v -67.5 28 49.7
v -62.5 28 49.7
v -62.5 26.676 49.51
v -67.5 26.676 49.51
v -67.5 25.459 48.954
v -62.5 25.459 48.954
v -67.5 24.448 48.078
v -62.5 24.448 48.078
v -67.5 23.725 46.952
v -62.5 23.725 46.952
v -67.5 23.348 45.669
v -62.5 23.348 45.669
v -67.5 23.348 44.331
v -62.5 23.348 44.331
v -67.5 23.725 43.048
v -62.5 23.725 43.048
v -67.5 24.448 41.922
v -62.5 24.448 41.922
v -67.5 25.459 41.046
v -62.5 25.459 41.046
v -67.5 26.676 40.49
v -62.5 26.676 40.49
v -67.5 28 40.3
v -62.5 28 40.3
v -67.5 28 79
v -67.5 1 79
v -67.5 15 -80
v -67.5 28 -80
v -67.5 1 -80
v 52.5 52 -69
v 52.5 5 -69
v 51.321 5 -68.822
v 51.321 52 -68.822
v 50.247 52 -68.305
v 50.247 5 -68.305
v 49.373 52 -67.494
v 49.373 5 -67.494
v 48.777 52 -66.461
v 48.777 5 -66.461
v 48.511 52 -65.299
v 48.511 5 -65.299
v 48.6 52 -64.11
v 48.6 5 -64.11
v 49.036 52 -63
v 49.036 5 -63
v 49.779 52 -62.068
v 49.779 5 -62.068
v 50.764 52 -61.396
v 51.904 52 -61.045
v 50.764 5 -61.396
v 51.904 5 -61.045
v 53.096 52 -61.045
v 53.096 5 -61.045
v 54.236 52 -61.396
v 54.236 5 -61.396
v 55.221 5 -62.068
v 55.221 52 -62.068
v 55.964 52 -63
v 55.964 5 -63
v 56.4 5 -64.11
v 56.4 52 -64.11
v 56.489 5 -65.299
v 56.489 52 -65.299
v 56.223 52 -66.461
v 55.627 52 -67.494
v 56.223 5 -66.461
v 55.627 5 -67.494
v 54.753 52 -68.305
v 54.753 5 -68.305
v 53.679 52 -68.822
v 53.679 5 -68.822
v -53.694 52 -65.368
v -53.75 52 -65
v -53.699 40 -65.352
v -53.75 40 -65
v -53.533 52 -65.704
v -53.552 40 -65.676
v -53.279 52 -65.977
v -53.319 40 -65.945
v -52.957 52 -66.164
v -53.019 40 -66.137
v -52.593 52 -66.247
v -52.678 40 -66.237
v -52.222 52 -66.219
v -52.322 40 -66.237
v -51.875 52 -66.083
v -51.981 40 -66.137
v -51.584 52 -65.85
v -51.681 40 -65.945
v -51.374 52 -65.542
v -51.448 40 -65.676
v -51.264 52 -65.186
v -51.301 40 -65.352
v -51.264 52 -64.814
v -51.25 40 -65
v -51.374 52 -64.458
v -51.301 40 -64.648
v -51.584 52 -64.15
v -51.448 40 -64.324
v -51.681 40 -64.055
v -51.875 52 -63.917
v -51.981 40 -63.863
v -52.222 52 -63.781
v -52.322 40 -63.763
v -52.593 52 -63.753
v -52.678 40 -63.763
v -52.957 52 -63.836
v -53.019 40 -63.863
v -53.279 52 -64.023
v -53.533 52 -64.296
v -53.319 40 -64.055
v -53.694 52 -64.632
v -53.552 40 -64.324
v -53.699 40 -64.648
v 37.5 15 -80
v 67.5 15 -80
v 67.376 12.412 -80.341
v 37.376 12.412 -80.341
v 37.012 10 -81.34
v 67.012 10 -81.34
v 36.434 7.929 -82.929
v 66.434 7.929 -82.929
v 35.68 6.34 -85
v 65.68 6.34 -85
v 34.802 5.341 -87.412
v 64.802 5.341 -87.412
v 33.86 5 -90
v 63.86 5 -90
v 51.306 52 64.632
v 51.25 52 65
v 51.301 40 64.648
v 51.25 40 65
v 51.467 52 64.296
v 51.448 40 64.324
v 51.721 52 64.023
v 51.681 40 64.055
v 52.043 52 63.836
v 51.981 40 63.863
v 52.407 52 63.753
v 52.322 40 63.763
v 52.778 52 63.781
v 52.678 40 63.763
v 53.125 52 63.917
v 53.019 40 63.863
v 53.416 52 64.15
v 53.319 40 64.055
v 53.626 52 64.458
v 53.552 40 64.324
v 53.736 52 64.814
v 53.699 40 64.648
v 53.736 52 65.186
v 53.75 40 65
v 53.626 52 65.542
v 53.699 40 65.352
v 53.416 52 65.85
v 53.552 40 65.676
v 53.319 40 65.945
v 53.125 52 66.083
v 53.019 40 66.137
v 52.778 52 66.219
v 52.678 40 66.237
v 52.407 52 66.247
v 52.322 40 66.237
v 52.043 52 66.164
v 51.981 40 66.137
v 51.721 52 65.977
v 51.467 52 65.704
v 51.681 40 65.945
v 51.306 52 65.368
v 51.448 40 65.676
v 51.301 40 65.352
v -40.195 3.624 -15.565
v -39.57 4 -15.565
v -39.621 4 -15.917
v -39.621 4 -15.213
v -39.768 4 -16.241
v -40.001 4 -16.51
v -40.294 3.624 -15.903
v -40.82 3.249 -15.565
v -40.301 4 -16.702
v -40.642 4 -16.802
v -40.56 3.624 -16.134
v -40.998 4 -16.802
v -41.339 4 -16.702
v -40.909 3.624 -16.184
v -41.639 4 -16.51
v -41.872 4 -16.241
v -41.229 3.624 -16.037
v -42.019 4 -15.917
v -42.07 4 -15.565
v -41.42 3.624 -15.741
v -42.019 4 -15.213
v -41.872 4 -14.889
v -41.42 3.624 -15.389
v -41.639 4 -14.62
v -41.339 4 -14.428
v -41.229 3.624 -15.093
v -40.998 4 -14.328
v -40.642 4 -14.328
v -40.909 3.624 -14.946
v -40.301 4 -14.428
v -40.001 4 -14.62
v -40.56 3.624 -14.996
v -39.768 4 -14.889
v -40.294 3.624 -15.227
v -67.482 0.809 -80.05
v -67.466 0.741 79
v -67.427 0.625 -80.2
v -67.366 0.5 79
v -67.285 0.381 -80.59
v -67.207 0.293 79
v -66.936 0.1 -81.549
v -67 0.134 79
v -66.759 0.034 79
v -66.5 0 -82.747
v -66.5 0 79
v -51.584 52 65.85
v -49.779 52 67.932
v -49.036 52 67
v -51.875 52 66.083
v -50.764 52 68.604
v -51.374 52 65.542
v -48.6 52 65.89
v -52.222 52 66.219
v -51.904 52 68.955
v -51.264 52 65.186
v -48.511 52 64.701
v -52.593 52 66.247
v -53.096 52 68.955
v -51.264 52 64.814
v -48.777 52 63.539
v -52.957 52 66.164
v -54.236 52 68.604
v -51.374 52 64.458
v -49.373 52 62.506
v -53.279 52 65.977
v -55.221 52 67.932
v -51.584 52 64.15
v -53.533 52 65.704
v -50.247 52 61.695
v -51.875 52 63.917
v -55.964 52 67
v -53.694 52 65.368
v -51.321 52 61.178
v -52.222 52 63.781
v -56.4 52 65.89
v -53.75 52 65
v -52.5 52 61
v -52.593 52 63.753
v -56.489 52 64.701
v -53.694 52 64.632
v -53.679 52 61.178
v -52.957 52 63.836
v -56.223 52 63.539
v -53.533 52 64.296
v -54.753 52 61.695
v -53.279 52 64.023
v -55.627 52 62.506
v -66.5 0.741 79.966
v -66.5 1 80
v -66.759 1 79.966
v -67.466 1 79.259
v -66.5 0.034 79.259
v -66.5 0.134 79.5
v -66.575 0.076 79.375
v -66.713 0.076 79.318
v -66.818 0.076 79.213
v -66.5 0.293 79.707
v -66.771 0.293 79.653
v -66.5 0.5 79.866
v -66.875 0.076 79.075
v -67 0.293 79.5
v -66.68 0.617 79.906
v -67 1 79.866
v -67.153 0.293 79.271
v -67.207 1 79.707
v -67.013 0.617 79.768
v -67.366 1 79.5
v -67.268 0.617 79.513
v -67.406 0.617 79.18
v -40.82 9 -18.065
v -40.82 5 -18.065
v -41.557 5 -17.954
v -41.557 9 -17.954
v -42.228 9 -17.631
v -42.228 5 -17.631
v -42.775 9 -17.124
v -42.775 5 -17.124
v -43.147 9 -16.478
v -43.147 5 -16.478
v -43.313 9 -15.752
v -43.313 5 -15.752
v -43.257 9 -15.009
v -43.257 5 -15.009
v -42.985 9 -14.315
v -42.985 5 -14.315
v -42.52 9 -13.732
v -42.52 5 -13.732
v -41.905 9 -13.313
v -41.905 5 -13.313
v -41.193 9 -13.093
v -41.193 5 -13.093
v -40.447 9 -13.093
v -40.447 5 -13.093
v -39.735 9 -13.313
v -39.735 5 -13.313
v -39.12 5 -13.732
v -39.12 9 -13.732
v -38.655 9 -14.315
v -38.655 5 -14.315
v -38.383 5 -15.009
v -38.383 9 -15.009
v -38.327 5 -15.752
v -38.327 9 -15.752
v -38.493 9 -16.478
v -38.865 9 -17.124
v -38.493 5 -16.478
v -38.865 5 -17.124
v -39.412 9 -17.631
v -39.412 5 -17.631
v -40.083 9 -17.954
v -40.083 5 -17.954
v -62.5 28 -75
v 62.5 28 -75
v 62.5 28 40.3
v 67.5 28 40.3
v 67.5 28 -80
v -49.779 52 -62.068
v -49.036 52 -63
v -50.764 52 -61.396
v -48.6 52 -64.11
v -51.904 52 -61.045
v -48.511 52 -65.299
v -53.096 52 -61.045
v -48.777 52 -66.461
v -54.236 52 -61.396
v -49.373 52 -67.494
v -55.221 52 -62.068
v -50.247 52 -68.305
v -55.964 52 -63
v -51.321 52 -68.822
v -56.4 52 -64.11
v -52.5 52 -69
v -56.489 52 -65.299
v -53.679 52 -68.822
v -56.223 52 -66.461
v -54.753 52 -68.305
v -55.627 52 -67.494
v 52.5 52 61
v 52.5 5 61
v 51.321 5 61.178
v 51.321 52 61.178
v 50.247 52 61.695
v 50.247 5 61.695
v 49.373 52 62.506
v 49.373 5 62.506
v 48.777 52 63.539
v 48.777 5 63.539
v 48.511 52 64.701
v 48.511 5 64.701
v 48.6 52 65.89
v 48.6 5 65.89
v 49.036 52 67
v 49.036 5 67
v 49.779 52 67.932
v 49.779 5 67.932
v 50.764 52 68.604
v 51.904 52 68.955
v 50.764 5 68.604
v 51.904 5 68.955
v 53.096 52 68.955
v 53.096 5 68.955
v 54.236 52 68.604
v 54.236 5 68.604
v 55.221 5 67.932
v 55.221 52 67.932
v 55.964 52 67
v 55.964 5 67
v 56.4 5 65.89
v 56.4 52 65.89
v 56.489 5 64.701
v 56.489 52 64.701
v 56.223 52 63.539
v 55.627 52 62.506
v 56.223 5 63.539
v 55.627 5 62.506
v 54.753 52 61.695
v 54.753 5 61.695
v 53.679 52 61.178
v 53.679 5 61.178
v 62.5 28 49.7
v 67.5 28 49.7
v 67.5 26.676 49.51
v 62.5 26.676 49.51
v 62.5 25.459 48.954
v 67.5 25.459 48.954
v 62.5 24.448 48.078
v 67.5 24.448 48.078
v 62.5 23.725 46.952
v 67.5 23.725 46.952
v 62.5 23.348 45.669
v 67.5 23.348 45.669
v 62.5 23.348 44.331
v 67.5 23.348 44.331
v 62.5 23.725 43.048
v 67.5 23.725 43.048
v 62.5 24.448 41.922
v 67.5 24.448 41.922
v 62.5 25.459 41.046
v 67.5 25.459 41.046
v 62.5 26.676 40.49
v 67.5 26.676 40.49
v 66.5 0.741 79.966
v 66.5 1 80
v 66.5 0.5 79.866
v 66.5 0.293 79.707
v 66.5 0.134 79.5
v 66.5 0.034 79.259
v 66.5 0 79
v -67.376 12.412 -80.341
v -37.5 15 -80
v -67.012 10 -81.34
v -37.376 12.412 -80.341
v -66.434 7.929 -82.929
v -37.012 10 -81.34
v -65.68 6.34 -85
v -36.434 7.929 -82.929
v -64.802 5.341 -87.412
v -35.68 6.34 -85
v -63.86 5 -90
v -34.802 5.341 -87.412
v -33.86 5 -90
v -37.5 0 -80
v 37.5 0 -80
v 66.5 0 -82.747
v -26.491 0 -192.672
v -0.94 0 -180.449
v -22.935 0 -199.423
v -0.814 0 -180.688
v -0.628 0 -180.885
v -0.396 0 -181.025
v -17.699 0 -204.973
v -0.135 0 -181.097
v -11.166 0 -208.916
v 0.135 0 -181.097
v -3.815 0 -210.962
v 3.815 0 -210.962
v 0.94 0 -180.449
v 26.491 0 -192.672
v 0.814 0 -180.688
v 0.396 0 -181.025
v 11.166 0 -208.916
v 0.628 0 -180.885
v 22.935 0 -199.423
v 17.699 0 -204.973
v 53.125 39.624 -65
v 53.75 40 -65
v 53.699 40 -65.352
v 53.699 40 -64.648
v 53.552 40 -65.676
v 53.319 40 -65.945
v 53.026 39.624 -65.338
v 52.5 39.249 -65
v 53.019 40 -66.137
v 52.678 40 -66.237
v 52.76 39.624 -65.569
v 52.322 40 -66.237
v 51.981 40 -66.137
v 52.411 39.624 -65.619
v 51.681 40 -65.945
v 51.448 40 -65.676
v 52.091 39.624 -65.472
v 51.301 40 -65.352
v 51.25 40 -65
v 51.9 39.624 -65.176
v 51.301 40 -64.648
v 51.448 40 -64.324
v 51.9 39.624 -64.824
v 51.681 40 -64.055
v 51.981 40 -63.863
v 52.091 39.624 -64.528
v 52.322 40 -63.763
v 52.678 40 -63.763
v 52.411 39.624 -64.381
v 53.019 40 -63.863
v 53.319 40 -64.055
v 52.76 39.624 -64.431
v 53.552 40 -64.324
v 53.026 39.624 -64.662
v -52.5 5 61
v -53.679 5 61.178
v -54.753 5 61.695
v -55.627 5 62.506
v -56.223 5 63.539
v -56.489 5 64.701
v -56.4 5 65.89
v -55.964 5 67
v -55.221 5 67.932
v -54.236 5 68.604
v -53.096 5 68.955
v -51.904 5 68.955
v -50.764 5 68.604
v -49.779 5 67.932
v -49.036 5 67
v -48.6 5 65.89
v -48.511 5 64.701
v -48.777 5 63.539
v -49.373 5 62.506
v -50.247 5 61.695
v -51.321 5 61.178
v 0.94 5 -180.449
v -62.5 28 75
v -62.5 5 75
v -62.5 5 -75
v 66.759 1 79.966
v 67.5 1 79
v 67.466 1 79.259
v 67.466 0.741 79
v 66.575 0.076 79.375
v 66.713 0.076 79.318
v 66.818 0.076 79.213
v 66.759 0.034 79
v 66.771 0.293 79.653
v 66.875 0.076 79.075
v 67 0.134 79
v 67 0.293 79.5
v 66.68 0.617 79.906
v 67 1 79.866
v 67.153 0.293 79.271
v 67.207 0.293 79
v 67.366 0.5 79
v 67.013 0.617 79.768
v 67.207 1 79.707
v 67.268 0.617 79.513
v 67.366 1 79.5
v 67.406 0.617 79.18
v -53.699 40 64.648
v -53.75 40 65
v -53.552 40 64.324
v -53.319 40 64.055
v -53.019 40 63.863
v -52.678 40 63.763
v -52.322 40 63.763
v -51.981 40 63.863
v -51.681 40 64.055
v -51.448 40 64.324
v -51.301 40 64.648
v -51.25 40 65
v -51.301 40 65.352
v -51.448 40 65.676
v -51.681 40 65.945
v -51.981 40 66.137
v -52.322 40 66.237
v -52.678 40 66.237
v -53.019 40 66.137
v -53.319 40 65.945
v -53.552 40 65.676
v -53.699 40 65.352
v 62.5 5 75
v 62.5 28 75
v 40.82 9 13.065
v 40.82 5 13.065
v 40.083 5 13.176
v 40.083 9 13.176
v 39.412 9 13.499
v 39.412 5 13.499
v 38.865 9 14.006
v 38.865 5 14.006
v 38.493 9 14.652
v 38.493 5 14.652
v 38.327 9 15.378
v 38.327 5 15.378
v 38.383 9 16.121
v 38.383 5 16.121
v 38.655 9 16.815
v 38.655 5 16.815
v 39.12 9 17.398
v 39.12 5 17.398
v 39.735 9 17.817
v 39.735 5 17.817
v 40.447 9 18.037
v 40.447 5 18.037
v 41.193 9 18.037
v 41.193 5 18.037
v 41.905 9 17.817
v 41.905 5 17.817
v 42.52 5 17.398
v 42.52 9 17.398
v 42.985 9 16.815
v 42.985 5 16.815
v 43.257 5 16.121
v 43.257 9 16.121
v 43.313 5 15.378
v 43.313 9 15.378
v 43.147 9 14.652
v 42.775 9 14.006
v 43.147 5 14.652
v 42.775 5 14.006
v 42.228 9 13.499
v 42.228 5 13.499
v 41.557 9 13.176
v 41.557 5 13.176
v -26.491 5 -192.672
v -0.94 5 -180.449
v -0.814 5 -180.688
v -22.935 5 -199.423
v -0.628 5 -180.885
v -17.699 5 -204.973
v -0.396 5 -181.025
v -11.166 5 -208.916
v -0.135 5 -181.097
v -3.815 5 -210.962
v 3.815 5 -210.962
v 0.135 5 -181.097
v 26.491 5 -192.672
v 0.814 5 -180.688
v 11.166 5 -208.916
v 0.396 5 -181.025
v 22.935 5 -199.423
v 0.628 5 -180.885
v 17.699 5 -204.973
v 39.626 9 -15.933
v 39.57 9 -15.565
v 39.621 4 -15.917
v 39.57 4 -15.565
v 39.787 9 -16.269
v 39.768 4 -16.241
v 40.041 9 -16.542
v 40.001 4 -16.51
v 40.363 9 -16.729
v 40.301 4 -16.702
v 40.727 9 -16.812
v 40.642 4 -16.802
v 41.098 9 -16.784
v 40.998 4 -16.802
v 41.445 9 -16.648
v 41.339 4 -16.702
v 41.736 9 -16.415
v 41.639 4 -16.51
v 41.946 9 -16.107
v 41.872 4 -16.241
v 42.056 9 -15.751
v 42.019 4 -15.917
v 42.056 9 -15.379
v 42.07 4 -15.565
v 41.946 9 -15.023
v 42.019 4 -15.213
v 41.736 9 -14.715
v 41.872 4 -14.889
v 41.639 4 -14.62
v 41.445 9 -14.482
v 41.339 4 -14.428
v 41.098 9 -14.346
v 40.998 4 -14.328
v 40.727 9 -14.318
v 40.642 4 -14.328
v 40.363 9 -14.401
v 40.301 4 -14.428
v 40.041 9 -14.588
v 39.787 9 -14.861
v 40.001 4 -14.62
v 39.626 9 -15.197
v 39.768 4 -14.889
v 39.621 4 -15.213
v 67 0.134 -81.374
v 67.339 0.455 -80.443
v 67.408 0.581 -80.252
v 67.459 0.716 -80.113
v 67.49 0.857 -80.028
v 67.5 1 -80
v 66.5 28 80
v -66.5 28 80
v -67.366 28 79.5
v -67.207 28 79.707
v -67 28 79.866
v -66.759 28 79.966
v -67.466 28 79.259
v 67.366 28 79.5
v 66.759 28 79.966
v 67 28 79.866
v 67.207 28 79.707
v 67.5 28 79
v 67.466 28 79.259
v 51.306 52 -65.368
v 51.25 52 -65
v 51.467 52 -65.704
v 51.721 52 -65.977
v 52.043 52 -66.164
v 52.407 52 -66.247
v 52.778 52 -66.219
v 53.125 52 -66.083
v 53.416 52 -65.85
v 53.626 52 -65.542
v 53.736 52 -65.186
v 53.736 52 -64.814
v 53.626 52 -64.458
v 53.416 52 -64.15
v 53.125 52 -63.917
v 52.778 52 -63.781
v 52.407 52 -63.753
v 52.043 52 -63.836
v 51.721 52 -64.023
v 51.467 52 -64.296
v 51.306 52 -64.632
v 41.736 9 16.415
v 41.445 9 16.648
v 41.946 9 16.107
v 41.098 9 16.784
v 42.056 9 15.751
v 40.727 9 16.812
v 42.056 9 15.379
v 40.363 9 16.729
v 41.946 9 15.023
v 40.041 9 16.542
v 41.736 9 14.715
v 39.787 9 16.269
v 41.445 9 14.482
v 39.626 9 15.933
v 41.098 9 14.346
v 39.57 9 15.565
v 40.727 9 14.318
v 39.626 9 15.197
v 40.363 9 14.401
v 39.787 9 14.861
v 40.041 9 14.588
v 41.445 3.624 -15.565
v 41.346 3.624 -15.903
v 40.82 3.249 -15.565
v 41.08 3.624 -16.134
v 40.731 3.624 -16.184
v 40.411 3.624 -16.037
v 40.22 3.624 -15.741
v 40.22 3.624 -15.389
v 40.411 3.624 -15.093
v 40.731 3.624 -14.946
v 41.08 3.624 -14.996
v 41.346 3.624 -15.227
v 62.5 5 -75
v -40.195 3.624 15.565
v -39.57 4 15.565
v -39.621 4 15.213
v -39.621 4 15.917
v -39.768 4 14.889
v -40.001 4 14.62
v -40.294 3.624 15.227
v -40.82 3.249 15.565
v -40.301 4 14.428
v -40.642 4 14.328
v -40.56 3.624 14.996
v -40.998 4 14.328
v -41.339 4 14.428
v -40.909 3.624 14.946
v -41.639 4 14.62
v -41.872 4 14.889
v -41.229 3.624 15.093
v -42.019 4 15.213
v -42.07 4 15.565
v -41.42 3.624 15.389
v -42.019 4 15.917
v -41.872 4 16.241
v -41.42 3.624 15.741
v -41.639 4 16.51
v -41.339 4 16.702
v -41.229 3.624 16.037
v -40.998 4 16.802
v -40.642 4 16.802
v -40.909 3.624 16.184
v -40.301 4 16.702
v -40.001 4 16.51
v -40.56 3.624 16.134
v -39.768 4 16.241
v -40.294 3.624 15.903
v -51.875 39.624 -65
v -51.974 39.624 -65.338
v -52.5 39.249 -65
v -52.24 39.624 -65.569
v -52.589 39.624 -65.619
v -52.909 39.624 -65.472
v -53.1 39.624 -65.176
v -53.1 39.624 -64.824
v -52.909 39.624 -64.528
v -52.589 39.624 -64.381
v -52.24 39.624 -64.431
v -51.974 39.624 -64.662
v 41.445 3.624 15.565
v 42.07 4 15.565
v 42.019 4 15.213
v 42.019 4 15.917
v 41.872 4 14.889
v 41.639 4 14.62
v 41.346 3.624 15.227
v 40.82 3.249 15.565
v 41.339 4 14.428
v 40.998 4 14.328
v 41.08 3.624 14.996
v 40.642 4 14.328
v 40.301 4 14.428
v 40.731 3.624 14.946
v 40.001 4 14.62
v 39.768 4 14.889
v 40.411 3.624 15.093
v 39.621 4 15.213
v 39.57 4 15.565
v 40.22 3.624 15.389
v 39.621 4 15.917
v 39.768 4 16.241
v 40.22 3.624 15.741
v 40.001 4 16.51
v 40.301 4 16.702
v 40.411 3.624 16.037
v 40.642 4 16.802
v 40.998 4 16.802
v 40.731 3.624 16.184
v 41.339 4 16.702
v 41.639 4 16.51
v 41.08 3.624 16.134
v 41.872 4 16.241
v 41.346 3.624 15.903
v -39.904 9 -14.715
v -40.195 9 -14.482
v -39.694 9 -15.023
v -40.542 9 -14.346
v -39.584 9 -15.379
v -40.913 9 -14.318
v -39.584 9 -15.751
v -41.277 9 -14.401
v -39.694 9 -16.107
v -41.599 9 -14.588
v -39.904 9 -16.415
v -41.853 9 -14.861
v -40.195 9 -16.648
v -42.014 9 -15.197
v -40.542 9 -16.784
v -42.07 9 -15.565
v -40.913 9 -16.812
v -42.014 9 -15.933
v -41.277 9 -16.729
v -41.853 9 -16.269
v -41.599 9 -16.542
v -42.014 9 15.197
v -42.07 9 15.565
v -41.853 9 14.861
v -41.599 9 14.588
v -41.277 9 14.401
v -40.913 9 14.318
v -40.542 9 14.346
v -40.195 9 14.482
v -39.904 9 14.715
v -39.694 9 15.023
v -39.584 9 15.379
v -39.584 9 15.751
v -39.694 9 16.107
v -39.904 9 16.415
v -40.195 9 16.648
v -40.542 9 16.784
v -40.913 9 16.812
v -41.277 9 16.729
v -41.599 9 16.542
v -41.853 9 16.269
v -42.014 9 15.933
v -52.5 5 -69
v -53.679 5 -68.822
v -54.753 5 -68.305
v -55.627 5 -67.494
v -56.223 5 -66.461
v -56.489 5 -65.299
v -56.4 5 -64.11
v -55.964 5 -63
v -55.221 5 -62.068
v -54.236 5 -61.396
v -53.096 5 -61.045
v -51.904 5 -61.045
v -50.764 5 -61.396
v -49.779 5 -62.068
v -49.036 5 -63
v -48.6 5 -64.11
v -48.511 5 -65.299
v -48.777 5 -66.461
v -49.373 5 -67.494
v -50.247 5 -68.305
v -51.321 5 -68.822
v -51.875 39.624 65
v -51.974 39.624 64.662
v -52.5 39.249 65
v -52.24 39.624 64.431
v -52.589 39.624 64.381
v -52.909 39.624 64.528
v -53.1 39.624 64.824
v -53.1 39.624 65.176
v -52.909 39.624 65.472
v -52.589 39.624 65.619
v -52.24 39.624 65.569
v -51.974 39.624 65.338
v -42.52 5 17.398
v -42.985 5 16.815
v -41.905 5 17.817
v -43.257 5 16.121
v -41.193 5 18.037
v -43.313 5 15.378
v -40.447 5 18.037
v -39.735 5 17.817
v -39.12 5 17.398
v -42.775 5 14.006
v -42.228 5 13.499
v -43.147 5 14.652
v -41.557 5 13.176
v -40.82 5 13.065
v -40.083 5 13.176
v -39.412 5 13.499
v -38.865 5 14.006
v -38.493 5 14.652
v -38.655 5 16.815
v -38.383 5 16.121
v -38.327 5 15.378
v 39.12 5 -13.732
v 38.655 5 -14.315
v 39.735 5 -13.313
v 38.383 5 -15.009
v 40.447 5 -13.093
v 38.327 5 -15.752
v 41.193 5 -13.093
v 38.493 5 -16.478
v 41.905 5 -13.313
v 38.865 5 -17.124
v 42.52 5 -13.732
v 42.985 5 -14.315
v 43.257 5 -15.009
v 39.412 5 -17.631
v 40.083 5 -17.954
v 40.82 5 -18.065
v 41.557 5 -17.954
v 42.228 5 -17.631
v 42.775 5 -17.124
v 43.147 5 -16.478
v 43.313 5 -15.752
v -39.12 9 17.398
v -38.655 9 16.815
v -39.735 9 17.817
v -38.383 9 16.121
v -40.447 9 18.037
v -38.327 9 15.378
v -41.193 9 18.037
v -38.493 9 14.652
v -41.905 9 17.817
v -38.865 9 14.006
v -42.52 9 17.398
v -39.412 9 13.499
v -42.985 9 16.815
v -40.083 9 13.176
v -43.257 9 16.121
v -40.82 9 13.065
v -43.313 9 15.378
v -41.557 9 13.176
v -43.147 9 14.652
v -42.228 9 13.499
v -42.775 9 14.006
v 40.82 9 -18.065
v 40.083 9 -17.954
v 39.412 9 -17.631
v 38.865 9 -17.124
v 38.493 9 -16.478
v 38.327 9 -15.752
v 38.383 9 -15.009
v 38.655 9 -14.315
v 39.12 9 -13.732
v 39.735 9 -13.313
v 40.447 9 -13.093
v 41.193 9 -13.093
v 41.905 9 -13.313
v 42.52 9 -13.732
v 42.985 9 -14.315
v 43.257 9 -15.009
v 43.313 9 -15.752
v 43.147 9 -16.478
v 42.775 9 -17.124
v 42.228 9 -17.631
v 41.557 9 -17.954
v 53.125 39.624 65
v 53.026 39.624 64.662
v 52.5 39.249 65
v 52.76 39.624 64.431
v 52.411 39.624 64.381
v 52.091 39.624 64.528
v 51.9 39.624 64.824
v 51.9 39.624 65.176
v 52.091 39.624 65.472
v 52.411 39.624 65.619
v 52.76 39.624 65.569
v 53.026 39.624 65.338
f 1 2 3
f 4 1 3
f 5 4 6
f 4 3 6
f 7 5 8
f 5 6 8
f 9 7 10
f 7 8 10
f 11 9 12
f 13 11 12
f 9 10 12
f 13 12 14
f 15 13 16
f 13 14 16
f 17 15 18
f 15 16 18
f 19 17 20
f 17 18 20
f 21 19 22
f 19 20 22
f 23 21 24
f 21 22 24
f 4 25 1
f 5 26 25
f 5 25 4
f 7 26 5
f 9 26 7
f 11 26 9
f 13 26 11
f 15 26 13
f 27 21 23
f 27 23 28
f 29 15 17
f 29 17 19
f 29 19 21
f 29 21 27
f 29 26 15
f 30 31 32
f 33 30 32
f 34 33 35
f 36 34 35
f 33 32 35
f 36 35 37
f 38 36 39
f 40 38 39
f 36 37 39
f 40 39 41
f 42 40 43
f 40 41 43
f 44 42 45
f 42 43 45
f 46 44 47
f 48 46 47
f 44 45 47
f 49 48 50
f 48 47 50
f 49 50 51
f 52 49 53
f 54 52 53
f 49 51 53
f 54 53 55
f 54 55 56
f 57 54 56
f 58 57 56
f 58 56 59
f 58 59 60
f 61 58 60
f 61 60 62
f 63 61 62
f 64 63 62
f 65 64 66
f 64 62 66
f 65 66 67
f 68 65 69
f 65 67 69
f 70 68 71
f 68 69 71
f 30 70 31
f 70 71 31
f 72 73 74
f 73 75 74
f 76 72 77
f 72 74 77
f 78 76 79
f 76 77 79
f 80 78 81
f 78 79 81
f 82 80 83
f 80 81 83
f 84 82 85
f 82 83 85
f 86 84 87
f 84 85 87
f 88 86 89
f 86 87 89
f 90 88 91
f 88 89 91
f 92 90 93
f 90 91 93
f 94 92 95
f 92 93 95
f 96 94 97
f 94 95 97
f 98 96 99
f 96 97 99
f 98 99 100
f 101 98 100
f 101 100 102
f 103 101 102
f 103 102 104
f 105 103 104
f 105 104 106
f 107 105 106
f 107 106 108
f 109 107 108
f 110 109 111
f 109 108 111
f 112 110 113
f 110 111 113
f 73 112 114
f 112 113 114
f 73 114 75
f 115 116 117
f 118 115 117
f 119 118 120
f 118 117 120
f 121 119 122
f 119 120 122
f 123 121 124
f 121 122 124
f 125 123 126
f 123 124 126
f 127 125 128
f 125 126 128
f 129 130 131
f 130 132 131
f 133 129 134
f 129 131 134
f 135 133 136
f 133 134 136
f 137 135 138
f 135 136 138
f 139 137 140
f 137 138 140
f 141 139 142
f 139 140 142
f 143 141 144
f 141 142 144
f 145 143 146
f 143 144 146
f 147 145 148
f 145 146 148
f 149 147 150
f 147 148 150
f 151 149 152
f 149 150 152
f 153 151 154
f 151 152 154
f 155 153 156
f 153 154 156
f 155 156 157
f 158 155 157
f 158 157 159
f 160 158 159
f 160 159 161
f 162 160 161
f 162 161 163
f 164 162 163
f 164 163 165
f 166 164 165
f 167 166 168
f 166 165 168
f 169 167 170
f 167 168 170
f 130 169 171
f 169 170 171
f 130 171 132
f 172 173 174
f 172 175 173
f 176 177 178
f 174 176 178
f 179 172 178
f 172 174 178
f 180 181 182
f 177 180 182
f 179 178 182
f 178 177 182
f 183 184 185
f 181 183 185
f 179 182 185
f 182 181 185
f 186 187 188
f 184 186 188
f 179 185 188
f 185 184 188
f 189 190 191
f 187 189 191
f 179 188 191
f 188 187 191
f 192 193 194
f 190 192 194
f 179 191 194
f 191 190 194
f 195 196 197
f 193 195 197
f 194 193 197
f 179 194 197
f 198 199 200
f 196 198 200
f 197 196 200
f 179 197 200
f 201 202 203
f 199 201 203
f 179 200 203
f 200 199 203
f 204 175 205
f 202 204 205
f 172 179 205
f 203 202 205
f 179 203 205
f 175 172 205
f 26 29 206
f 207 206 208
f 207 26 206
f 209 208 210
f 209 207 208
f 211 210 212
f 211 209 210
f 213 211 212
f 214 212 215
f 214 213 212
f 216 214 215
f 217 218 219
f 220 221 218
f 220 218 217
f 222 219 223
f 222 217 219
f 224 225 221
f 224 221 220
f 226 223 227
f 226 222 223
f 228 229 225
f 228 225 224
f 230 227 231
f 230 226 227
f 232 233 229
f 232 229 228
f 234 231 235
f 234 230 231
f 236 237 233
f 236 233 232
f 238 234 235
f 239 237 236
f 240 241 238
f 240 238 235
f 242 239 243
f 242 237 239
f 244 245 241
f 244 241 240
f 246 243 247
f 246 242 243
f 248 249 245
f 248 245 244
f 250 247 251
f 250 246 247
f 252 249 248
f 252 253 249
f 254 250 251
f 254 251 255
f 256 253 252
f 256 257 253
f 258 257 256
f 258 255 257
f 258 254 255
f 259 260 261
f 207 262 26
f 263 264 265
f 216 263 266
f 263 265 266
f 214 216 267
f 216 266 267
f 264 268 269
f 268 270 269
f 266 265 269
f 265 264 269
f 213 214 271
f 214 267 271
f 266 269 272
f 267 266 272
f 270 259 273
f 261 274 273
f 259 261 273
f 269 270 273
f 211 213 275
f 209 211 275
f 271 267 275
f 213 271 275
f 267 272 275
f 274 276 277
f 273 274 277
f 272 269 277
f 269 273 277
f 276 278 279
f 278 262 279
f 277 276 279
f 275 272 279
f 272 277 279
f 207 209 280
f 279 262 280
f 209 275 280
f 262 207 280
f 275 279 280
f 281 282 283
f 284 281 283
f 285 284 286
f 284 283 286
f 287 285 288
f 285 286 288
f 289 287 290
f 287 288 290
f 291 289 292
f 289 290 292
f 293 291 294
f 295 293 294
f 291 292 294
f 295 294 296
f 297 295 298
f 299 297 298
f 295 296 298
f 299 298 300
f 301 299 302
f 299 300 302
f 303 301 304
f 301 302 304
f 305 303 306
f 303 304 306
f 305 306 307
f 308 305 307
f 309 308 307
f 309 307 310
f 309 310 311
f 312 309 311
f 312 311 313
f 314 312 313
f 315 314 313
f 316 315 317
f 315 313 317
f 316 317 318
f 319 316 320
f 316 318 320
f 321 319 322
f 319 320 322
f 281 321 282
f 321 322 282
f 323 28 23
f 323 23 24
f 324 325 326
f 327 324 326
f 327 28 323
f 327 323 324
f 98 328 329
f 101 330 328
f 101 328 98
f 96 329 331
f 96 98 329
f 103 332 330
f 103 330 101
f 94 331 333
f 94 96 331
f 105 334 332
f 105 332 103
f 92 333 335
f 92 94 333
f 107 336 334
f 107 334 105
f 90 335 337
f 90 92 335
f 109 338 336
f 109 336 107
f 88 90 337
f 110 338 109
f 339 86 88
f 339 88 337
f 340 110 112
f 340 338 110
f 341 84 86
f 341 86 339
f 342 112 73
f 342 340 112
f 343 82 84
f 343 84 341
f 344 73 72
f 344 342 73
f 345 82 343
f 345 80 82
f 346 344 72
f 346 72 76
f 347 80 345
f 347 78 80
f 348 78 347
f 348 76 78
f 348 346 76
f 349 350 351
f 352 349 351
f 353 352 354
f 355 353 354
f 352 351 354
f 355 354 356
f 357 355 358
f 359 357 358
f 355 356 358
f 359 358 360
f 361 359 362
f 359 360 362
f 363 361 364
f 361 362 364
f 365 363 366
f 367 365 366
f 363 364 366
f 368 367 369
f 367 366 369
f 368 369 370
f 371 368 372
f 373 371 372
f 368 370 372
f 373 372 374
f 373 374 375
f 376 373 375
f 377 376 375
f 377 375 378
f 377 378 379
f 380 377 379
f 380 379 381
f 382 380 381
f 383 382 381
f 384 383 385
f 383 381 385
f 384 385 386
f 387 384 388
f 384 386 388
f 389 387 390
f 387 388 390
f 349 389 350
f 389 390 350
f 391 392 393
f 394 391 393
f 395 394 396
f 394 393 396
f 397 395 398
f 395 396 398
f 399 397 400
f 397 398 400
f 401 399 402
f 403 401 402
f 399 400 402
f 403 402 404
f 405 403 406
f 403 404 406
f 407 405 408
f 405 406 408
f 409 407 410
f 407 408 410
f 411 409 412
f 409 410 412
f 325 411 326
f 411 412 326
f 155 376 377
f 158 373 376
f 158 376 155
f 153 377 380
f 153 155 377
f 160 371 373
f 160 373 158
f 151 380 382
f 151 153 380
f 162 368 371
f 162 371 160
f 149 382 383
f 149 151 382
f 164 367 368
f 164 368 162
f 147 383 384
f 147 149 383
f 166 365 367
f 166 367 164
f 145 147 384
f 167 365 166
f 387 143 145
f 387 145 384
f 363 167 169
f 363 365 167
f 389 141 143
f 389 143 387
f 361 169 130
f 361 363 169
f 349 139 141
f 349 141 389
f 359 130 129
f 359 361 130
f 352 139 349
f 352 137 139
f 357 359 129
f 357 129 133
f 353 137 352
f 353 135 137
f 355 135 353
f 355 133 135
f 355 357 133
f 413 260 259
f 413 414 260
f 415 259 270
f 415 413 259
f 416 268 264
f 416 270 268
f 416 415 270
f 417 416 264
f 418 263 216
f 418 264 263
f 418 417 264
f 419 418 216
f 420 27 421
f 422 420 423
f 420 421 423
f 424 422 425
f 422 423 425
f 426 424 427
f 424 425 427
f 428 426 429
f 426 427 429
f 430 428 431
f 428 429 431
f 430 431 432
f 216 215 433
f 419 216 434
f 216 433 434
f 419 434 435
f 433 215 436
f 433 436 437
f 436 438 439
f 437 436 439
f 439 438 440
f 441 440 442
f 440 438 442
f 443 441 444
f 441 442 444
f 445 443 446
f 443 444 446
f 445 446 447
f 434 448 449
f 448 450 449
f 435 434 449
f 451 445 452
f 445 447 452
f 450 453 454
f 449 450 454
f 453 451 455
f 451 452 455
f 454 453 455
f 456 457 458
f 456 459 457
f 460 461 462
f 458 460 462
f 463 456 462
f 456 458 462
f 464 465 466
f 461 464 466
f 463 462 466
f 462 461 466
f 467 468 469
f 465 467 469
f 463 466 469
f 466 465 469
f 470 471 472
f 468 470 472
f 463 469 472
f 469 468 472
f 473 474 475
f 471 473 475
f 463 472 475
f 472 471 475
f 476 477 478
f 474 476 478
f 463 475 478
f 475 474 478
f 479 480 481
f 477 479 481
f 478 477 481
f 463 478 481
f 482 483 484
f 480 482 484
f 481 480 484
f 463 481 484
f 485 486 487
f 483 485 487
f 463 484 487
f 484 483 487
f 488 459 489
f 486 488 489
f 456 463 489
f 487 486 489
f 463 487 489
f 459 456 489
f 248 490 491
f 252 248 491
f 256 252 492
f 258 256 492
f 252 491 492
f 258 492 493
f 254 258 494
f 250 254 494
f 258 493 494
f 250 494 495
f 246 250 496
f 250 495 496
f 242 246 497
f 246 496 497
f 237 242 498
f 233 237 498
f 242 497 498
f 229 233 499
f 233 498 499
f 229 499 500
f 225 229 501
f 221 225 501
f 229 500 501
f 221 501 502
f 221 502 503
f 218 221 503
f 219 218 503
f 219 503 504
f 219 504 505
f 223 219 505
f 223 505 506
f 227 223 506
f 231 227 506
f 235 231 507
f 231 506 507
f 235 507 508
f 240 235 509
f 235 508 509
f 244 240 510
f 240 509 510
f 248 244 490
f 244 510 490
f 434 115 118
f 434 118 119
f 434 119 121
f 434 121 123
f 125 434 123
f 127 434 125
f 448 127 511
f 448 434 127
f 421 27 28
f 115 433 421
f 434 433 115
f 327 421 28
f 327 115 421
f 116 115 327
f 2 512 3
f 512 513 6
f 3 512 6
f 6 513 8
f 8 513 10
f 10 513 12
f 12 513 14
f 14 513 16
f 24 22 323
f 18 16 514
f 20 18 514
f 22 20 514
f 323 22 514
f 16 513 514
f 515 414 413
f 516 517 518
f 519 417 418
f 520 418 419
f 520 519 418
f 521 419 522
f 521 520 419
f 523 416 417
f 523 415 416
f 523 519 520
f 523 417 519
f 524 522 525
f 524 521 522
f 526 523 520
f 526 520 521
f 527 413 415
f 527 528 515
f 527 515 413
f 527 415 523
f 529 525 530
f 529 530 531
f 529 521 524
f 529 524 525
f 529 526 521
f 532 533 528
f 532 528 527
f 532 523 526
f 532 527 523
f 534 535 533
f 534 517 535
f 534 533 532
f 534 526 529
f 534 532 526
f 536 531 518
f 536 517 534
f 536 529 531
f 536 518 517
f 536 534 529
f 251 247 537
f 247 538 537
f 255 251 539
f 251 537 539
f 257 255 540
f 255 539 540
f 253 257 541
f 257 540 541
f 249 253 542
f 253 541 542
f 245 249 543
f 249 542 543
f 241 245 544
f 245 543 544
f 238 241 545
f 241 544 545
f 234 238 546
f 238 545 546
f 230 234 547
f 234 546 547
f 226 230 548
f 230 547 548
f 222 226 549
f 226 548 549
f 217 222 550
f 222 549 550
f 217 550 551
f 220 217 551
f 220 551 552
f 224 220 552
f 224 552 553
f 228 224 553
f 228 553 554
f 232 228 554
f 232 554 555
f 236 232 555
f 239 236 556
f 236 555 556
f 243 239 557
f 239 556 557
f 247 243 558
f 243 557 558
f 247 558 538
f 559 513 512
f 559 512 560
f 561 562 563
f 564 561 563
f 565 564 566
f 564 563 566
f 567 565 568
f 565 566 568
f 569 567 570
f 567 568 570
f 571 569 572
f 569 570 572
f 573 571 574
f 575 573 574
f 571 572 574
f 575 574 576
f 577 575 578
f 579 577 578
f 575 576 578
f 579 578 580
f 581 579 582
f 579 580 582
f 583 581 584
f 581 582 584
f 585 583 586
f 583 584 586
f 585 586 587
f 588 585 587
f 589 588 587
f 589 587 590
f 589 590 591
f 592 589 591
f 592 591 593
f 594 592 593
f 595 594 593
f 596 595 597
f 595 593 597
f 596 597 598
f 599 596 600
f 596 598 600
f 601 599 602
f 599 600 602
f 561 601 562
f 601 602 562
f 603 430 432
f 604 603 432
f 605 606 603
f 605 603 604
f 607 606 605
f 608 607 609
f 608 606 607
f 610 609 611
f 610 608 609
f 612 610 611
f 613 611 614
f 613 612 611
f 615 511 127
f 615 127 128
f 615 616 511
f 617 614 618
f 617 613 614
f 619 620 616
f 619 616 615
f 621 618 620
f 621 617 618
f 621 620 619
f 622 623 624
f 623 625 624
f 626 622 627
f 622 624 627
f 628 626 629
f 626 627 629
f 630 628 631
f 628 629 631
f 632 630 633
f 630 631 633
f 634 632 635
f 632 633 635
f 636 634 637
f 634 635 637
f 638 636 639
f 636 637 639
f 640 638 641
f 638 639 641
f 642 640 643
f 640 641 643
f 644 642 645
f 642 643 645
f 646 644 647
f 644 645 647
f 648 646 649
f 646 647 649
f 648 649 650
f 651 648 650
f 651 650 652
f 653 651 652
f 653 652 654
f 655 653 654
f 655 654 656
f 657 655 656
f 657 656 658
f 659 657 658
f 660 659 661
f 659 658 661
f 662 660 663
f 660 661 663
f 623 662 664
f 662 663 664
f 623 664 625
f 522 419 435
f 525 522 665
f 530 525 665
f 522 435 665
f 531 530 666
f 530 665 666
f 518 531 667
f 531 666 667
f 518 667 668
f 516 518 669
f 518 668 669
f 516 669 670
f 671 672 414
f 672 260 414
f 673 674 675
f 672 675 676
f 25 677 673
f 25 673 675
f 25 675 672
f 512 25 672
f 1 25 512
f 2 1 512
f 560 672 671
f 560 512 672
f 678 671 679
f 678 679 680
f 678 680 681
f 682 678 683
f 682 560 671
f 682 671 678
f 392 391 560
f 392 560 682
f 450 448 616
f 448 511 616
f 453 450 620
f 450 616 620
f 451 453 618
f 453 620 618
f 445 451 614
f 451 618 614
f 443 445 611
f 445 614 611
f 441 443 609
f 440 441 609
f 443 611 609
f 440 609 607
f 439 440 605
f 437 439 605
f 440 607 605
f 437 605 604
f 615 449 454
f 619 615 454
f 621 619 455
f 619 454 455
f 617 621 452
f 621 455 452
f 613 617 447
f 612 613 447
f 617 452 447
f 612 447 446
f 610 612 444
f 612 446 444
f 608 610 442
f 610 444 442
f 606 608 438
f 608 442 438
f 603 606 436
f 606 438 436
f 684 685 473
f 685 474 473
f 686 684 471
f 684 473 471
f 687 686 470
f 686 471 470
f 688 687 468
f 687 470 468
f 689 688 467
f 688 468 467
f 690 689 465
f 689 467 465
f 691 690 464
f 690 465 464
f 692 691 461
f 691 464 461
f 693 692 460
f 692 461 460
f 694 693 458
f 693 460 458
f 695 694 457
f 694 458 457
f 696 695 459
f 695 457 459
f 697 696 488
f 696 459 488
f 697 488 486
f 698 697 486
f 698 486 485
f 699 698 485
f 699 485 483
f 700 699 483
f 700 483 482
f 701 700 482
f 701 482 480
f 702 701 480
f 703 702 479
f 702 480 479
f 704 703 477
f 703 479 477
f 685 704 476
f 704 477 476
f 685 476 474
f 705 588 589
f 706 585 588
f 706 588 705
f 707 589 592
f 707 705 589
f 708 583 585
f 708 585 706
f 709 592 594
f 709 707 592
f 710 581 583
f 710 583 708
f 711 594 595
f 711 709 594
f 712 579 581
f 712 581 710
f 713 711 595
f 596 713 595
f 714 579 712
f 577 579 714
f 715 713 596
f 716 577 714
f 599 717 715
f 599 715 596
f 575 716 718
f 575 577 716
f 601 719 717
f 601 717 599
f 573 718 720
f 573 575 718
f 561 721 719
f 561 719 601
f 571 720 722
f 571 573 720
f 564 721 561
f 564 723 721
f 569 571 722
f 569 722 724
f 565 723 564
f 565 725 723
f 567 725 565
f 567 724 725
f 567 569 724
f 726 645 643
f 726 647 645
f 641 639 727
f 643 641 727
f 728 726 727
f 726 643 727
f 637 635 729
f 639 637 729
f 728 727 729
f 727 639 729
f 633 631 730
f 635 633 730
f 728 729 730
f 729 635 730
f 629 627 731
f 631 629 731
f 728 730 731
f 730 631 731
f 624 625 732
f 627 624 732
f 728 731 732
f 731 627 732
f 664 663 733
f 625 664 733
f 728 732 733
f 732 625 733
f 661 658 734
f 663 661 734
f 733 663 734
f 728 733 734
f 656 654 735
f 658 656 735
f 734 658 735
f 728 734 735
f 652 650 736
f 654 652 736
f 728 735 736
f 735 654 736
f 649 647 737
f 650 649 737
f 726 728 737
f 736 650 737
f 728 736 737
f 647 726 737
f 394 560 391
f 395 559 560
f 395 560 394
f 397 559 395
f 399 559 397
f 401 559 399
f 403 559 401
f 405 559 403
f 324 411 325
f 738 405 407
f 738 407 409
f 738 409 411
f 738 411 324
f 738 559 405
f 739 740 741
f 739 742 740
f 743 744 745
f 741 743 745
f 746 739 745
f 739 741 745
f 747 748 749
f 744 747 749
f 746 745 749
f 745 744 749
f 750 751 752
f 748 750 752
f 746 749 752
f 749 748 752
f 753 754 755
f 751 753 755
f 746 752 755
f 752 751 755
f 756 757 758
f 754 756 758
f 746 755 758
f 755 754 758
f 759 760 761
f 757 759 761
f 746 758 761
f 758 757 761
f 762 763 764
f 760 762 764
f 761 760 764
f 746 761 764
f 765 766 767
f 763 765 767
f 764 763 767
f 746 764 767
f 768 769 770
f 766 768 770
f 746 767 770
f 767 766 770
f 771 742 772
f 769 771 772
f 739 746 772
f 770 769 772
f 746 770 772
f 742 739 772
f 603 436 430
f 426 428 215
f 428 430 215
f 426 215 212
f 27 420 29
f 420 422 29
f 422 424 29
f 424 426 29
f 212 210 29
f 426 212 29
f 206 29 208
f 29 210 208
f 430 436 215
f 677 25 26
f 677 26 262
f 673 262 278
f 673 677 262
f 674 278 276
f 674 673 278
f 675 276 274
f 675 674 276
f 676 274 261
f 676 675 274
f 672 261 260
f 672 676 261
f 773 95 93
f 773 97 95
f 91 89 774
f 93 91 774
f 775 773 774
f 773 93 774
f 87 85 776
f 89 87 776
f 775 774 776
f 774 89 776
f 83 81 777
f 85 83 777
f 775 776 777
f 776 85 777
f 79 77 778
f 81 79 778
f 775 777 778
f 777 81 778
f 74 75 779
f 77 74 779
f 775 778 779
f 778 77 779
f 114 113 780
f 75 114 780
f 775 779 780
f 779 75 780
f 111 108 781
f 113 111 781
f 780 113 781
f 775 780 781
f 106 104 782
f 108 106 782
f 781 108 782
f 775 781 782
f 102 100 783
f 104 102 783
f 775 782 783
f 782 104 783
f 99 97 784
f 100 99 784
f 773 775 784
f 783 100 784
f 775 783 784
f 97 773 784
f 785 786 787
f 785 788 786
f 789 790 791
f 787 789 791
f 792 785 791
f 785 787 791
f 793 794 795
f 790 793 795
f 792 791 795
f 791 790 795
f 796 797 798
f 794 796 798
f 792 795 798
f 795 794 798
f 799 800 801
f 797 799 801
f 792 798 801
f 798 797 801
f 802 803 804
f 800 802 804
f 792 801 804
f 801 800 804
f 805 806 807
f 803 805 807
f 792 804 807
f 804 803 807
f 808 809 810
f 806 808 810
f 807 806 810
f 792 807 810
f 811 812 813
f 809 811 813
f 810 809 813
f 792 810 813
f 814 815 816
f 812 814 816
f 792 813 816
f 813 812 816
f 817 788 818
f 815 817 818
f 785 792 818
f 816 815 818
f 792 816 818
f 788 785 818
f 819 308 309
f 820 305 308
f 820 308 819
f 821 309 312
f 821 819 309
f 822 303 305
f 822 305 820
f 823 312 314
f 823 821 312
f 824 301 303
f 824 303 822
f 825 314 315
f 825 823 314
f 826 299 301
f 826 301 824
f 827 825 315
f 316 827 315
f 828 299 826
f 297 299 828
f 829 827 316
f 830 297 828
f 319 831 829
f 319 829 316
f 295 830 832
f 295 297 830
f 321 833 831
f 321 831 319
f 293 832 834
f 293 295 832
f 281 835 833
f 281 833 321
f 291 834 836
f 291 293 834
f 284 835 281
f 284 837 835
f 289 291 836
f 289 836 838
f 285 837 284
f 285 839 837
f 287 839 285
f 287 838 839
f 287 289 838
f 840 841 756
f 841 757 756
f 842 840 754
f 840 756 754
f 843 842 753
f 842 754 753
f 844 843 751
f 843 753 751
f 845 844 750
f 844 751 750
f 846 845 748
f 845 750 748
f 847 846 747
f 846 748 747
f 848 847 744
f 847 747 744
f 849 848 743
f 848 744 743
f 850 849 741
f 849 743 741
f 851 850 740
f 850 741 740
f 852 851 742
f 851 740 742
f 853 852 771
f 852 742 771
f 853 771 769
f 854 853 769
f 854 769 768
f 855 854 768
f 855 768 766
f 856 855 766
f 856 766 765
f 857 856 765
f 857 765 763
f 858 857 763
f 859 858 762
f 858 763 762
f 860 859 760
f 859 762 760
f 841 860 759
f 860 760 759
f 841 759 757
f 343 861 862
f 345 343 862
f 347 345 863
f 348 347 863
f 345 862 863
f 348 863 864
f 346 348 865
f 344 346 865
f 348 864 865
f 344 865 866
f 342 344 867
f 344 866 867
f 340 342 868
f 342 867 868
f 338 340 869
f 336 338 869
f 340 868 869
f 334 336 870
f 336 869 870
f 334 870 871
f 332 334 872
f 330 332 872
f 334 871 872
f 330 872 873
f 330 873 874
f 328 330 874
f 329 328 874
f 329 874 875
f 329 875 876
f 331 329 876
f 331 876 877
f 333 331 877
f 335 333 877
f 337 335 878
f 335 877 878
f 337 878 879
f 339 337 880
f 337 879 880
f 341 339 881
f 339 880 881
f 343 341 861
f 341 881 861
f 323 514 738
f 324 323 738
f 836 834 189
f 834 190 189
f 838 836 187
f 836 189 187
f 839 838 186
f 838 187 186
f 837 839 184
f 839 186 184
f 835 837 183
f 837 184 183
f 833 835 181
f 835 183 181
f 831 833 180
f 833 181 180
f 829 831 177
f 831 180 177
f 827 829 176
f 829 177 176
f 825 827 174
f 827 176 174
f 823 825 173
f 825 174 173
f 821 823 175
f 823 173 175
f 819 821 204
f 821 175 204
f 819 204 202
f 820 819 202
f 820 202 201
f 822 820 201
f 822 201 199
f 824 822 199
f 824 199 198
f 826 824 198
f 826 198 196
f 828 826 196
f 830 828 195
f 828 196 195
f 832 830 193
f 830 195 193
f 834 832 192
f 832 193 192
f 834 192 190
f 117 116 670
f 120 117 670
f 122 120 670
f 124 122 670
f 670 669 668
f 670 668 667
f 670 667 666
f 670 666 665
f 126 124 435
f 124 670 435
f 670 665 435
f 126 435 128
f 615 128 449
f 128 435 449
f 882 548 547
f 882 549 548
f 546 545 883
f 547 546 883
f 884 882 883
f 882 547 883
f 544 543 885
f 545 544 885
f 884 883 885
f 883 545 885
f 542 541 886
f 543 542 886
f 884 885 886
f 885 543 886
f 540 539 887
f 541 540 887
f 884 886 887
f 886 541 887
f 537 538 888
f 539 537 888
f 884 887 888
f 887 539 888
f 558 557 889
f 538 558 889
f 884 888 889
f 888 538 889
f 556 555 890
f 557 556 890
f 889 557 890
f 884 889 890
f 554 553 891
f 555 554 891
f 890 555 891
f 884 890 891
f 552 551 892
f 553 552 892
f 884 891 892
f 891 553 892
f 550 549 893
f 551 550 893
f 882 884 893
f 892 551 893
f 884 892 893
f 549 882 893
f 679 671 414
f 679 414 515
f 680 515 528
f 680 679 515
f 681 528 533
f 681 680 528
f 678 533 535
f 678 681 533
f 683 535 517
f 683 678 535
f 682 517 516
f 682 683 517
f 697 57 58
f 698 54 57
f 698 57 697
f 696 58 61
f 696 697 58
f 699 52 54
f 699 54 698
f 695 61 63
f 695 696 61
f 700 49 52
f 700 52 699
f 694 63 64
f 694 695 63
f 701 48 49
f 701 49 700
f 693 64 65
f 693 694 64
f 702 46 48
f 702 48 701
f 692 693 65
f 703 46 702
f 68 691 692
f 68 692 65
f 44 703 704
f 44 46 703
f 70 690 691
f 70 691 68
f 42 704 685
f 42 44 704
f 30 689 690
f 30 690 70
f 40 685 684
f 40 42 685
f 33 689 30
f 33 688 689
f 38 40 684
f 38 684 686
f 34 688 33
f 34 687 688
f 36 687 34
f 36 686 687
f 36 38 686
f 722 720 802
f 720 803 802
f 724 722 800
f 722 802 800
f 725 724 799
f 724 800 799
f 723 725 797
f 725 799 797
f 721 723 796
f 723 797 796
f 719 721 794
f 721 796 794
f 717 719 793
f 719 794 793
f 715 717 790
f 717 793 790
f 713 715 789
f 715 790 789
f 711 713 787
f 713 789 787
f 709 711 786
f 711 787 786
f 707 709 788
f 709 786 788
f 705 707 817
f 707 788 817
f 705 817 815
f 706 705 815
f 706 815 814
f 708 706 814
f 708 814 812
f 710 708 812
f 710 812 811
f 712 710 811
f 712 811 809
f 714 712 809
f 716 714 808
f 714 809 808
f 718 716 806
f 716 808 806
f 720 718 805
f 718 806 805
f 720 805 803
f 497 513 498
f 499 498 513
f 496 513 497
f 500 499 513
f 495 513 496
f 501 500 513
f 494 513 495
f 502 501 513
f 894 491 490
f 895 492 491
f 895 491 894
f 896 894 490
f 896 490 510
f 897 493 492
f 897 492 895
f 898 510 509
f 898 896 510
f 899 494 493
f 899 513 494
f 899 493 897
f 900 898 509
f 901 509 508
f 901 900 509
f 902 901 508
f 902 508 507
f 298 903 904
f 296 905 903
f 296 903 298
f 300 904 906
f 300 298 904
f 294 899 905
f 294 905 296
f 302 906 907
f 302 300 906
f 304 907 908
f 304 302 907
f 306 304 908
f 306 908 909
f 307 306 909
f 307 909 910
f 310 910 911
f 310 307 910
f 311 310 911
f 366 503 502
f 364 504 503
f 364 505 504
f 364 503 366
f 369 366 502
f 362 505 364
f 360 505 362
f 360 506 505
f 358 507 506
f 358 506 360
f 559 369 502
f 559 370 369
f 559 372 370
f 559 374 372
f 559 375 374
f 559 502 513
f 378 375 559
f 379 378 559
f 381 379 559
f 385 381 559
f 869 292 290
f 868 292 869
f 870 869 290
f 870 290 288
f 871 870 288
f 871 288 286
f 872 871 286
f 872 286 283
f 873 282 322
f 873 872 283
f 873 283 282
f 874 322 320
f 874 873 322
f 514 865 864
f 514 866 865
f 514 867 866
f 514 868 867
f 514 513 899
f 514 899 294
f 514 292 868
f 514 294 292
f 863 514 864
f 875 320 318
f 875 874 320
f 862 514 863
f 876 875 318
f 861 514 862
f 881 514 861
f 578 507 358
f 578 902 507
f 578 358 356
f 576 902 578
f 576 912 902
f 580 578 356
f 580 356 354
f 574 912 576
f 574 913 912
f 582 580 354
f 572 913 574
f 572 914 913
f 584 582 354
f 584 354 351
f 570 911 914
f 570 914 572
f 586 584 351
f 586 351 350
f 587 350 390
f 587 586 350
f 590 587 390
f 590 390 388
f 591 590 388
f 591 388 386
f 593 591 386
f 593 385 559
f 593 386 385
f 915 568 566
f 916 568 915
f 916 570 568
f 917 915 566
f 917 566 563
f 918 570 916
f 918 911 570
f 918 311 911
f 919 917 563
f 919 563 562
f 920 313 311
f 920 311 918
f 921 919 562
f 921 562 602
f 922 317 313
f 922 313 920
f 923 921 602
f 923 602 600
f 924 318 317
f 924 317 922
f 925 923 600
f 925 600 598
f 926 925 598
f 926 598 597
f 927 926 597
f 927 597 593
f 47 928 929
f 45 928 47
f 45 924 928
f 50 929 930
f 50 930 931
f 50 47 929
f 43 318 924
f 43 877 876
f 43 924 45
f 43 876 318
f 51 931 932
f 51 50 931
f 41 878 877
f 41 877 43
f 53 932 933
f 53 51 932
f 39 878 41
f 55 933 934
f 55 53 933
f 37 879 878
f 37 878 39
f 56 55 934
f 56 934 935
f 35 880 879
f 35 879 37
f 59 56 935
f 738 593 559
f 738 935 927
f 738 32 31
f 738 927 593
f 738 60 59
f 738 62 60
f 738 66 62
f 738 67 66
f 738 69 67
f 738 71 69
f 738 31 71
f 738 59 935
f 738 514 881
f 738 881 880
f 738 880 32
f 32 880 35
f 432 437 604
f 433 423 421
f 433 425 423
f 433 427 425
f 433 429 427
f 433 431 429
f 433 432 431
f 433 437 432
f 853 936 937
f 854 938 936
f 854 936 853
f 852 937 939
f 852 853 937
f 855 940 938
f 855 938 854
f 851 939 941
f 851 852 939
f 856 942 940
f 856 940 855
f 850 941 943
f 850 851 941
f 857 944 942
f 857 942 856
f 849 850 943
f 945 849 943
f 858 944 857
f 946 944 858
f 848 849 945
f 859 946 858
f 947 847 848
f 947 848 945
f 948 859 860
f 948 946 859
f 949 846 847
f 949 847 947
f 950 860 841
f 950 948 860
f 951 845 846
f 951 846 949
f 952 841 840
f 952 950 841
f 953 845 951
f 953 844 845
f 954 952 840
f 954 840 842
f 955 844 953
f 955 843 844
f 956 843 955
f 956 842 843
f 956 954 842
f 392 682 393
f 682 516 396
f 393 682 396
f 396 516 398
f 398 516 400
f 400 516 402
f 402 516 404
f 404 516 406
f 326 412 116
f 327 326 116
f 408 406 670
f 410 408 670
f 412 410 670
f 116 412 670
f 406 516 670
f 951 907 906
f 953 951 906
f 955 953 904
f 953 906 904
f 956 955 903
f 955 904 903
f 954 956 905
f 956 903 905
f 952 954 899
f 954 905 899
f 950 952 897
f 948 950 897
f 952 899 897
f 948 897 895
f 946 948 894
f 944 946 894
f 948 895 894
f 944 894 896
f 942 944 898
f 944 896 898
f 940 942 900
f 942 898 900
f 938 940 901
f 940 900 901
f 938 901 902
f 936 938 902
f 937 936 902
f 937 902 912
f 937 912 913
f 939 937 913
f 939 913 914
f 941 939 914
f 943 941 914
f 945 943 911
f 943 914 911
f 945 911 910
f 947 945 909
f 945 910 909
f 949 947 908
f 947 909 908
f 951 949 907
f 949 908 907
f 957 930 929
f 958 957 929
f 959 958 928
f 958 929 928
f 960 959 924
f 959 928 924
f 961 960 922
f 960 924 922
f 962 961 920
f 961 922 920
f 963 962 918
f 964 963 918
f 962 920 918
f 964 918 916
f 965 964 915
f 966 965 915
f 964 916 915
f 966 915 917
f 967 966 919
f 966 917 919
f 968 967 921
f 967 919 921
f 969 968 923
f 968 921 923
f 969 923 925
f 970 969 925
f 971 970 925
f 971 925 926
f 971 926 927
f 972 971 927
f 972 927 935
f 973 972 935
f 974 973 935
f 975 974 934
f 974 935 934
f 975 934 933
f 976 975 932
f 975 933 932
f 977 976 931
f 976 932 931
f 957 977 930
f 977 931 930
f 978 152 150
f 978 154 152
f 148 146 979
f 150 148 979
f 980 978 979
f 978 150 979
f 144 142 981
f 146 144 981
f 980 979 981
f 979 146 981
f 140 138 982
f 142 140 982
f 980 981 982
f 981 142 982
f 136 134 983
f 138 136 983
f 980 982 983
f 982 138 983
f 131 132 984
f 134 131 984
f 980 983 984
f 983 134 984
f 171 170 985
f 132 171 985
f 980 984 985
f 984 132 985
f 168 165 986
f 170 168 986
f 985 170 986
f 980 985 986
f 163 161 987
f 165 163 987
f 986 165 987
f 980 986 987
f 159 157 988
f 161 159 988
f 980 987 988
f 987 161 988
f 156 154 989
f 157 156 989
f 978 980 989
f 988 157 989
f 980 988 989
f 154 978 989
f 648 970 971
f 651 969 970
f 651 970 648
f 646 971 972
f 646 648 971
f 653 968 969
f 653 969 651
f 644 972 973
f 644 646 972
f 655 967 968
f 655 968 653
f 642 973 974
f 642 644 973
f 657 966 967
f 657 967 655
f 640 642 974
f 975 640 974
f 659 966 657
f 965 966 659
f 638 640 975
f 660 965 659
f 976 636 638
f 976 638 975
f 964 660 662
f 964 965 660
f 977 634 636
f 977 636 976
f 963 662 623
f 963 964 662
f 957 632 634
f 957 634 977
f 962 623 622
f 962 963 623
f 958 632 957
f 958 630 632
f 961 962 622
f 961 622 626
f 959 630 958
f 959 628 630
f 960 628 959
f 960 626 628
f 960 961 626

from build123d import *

# Parameters (mm, degrees)
BOSS_EXTRUDE1_DEPTH            = 5
SKETCH2_W                      = 135
SKETCH2_H                      = 160
SKETCH2_W_2                    = 125
SKETCH2_H_2                    = 150
BOSS_EXTRUDE2_DEPTH            = 23
SKETCH3_R                      = 4.7
CUT_EXTRUDE1_DEPTH             = 140
SKETCH4_R                      = 4
BOSS_EXTRUDE3_DEPTH            = 47
F_2_5MM_DOWEL_HOLE1_D          = 2.5
F_2_5MM_DOWEL_HOLE1_DEPTH      = 12
F_2_5MM_DOWEL_HOLE1_TIP        = 0.751075774
FILLET1_R                      = 1
SKETCH8_R                      = 2.5
BOSS_EXTRUDE4_DEPTH            = 4
F_2_5_2_5_DIAMETER_HOLE2_D     = 2.5
F_2_5_2_5_DIAMETER_HOLE2_DEPTH = 5
F_2_5_2_5_DIAMETER_HOLE2_TIP   = 0.751075774
FILLET2_R                      = 10


with BuildPart() as part:
    # Sketch1 → Boss-Extrude1 (new body)
    with BuildSketch(Plane(origin=(0, 0, 0), x_dir=(1, 0, 0), z_dir=(0, 1, 0))):
        with BuildLine():
            Line((-67.5, 80), (-67.5, -80))
            Line((-67.5, -80), (67.5, -80))
            Line((67.5, -80), (67.5, 80))
            Line((67.5, 80), (26.490666647, 192.672217375))
            ThreePointArc((26.490666647, 192.672217375), (0, 211.221181853), (-26.490666647, 192.672217375))
            Line((-26.490666647, 192.672217375), (-67.5, 80))
        make_face()
        Polygon((-37.5, 80), (37.5, 80), (0, 183.03040323), align=None, mode=Mode.SUBTRACT)
    extrude(amount=BOSS_EXTRUDE1_DEPTH)

    # Sketch2 → Boss-Extrude2 (add)
    with BuildSketch(Plane(origin=(0, 5, 0), x_dir=(1, 0, 0), z_dir=(0, 1, 0))):
        Rectangle(SKETCH2_W, SKETCH2_H)
        Rectangle(SKETCH2_W_2, SKETCH2_H_2, mode=Mode.SUBTRACT)
    extrude(amount=BOSS_EXTRUDE2_DEPTH)

    # Sketch3 → Cut-Extrude1 (cut)
    with BuildSketch(Plane(origin=(67.5, 0, 0), x_dir=(0, 0, -1), z_dir=(1, 0, 0))):
        with Locations((-45, 28)):
            Circle(SKETCH3_R)
    extrude(amount=-CUT_EXTRUDE1_DEPTH, mode=Mode.SUBTRACT)

    # Sketch4 → Boss-Extrude3 (add)
    with BuildSketch(Plane(origin=(0, 5, 0), x_dir=(1, 0, 0), z_dir=(0, 1, 0))):
        with Locations(Location((-52.5, 65, 0), (0, 0, 90))):
            Circle(SKETCH4_R)
        with Locations(Location((52.5, 65, 0), (0, 0, 90))):
            Circle(SKETCH4_R)
        with Locations(Location((52.5, -65, 0), (0, 0, 90))):
            Circle(SKETCH4_R)
        with Locations(Location((-52.5, -65, 0), (0, 0, 90))):
            Circle(SKETCH4_R)
    extrude(amount=BOSS_EXTRUDE3_DEPTH)

    # Ø2.5mm Dowel Hole1
    with Locations(Plane(origin=(0, 52, 0), x_dir=(1, 0, 0), z_dir=(0, 1, 0))):
        with Locations((-52.5, 65), (52.5, 65), (52.5, -65), (-52.5, -45), (-52.5, -65)):
            Hole(F_2_5MM_DOWEL_HOLE1_D / 2, depth=F_2_5MM_DOWEL_HOLE1_DEPTH)
            with Locations((0, 0, -(F_2_5MM_DOWEL_HOLE1_DEPTH + F_2_5MM_DOWEL_HOLE1_TIP / 2))):  # 118° drill point
                Cone(0, F_2_5MM_DOWEL_HOLE1_D / 2, F_2_5MM_DOWEL_HOLE1_TIP, mode=Mode.SUBTRACT)

    # Fillet1
    fillet1_edges = [part.edges().sort_by_distance(p)[0] for p in [
        (67.5, 14, 80),
        (-67.5, 14, 80),
        (0, 2.5, -183.03040323),
        (0, 0, 80),
        (-67.5, 0, 0),
        (67.5, 0, 0),
    ]]
    fillet(fillet1_edges, radius=FILLET1_R)

    # Sketch8 → Boss-Extrude4 (add)
    with BuildSketch(Plane(origin=(0, 5, 0), x_dir=(1, 0, 0), z_dir=(0, 1, 0))):
        with Locations(Location((-40.82, 15.565, 0), (0, 0, 90))):
            Circle(SKETCH8_R)
        with Locations(Location((-40.82, -15.565, 0), (0, 0, 90))):
            Circle(SKETCH8_R)
        with Locations(Location((40.82, -15.565, 0), (0, 0, 90))):
            Circle(SKETCH8_R)
        with Locations(Location((40.82, 15.565, 0), (0, 0, 90))):
            Circle(SKETCH8_R)
    extrude(amount=BOSS_EXTRUDE4_DEPTH)

    # Ø2.5 (2.5) Diameter Hole2
    with Locations(Plane(origin=(0, 9, 0), x_dir=(1, 0, 0), z_dir=(0, 1, 0))):
        with Locations((-40.82, 15.565), (-40.82, -15.565), (40.82, -15.565), (40.82, 15.565)):
            Hole(F_2_5_2_5_DIAMETER_HOLE2_D / 2, depth=F_2_5_2_5_DIAMETER_HOLE2_DEPTH)
            with Locations((0, 0, -(F_2_5_2_5_DIAMETER_HOLE2_DEPTH + F_2_5_2_5_DIAMETER_HOLE2_TIP / 2))):  # 118° drill point
                Cone(0, F_2_5_2_5_DIAMETER_HOLE2_D / 2, F_2_5_2_5_DIAMETER_HOLE2_TIP, mode=Mode.SUBTRACT)

    # Fillet2
    fillet2_edges = [part.edges().sort_by_distance(p)[0] for p in [
        (-52.5, 5, -80),
        (52.5, 5, -80),
    ]]
    fillet(fillet2_edges, radius=FILLET2_R)


solid = part.part
